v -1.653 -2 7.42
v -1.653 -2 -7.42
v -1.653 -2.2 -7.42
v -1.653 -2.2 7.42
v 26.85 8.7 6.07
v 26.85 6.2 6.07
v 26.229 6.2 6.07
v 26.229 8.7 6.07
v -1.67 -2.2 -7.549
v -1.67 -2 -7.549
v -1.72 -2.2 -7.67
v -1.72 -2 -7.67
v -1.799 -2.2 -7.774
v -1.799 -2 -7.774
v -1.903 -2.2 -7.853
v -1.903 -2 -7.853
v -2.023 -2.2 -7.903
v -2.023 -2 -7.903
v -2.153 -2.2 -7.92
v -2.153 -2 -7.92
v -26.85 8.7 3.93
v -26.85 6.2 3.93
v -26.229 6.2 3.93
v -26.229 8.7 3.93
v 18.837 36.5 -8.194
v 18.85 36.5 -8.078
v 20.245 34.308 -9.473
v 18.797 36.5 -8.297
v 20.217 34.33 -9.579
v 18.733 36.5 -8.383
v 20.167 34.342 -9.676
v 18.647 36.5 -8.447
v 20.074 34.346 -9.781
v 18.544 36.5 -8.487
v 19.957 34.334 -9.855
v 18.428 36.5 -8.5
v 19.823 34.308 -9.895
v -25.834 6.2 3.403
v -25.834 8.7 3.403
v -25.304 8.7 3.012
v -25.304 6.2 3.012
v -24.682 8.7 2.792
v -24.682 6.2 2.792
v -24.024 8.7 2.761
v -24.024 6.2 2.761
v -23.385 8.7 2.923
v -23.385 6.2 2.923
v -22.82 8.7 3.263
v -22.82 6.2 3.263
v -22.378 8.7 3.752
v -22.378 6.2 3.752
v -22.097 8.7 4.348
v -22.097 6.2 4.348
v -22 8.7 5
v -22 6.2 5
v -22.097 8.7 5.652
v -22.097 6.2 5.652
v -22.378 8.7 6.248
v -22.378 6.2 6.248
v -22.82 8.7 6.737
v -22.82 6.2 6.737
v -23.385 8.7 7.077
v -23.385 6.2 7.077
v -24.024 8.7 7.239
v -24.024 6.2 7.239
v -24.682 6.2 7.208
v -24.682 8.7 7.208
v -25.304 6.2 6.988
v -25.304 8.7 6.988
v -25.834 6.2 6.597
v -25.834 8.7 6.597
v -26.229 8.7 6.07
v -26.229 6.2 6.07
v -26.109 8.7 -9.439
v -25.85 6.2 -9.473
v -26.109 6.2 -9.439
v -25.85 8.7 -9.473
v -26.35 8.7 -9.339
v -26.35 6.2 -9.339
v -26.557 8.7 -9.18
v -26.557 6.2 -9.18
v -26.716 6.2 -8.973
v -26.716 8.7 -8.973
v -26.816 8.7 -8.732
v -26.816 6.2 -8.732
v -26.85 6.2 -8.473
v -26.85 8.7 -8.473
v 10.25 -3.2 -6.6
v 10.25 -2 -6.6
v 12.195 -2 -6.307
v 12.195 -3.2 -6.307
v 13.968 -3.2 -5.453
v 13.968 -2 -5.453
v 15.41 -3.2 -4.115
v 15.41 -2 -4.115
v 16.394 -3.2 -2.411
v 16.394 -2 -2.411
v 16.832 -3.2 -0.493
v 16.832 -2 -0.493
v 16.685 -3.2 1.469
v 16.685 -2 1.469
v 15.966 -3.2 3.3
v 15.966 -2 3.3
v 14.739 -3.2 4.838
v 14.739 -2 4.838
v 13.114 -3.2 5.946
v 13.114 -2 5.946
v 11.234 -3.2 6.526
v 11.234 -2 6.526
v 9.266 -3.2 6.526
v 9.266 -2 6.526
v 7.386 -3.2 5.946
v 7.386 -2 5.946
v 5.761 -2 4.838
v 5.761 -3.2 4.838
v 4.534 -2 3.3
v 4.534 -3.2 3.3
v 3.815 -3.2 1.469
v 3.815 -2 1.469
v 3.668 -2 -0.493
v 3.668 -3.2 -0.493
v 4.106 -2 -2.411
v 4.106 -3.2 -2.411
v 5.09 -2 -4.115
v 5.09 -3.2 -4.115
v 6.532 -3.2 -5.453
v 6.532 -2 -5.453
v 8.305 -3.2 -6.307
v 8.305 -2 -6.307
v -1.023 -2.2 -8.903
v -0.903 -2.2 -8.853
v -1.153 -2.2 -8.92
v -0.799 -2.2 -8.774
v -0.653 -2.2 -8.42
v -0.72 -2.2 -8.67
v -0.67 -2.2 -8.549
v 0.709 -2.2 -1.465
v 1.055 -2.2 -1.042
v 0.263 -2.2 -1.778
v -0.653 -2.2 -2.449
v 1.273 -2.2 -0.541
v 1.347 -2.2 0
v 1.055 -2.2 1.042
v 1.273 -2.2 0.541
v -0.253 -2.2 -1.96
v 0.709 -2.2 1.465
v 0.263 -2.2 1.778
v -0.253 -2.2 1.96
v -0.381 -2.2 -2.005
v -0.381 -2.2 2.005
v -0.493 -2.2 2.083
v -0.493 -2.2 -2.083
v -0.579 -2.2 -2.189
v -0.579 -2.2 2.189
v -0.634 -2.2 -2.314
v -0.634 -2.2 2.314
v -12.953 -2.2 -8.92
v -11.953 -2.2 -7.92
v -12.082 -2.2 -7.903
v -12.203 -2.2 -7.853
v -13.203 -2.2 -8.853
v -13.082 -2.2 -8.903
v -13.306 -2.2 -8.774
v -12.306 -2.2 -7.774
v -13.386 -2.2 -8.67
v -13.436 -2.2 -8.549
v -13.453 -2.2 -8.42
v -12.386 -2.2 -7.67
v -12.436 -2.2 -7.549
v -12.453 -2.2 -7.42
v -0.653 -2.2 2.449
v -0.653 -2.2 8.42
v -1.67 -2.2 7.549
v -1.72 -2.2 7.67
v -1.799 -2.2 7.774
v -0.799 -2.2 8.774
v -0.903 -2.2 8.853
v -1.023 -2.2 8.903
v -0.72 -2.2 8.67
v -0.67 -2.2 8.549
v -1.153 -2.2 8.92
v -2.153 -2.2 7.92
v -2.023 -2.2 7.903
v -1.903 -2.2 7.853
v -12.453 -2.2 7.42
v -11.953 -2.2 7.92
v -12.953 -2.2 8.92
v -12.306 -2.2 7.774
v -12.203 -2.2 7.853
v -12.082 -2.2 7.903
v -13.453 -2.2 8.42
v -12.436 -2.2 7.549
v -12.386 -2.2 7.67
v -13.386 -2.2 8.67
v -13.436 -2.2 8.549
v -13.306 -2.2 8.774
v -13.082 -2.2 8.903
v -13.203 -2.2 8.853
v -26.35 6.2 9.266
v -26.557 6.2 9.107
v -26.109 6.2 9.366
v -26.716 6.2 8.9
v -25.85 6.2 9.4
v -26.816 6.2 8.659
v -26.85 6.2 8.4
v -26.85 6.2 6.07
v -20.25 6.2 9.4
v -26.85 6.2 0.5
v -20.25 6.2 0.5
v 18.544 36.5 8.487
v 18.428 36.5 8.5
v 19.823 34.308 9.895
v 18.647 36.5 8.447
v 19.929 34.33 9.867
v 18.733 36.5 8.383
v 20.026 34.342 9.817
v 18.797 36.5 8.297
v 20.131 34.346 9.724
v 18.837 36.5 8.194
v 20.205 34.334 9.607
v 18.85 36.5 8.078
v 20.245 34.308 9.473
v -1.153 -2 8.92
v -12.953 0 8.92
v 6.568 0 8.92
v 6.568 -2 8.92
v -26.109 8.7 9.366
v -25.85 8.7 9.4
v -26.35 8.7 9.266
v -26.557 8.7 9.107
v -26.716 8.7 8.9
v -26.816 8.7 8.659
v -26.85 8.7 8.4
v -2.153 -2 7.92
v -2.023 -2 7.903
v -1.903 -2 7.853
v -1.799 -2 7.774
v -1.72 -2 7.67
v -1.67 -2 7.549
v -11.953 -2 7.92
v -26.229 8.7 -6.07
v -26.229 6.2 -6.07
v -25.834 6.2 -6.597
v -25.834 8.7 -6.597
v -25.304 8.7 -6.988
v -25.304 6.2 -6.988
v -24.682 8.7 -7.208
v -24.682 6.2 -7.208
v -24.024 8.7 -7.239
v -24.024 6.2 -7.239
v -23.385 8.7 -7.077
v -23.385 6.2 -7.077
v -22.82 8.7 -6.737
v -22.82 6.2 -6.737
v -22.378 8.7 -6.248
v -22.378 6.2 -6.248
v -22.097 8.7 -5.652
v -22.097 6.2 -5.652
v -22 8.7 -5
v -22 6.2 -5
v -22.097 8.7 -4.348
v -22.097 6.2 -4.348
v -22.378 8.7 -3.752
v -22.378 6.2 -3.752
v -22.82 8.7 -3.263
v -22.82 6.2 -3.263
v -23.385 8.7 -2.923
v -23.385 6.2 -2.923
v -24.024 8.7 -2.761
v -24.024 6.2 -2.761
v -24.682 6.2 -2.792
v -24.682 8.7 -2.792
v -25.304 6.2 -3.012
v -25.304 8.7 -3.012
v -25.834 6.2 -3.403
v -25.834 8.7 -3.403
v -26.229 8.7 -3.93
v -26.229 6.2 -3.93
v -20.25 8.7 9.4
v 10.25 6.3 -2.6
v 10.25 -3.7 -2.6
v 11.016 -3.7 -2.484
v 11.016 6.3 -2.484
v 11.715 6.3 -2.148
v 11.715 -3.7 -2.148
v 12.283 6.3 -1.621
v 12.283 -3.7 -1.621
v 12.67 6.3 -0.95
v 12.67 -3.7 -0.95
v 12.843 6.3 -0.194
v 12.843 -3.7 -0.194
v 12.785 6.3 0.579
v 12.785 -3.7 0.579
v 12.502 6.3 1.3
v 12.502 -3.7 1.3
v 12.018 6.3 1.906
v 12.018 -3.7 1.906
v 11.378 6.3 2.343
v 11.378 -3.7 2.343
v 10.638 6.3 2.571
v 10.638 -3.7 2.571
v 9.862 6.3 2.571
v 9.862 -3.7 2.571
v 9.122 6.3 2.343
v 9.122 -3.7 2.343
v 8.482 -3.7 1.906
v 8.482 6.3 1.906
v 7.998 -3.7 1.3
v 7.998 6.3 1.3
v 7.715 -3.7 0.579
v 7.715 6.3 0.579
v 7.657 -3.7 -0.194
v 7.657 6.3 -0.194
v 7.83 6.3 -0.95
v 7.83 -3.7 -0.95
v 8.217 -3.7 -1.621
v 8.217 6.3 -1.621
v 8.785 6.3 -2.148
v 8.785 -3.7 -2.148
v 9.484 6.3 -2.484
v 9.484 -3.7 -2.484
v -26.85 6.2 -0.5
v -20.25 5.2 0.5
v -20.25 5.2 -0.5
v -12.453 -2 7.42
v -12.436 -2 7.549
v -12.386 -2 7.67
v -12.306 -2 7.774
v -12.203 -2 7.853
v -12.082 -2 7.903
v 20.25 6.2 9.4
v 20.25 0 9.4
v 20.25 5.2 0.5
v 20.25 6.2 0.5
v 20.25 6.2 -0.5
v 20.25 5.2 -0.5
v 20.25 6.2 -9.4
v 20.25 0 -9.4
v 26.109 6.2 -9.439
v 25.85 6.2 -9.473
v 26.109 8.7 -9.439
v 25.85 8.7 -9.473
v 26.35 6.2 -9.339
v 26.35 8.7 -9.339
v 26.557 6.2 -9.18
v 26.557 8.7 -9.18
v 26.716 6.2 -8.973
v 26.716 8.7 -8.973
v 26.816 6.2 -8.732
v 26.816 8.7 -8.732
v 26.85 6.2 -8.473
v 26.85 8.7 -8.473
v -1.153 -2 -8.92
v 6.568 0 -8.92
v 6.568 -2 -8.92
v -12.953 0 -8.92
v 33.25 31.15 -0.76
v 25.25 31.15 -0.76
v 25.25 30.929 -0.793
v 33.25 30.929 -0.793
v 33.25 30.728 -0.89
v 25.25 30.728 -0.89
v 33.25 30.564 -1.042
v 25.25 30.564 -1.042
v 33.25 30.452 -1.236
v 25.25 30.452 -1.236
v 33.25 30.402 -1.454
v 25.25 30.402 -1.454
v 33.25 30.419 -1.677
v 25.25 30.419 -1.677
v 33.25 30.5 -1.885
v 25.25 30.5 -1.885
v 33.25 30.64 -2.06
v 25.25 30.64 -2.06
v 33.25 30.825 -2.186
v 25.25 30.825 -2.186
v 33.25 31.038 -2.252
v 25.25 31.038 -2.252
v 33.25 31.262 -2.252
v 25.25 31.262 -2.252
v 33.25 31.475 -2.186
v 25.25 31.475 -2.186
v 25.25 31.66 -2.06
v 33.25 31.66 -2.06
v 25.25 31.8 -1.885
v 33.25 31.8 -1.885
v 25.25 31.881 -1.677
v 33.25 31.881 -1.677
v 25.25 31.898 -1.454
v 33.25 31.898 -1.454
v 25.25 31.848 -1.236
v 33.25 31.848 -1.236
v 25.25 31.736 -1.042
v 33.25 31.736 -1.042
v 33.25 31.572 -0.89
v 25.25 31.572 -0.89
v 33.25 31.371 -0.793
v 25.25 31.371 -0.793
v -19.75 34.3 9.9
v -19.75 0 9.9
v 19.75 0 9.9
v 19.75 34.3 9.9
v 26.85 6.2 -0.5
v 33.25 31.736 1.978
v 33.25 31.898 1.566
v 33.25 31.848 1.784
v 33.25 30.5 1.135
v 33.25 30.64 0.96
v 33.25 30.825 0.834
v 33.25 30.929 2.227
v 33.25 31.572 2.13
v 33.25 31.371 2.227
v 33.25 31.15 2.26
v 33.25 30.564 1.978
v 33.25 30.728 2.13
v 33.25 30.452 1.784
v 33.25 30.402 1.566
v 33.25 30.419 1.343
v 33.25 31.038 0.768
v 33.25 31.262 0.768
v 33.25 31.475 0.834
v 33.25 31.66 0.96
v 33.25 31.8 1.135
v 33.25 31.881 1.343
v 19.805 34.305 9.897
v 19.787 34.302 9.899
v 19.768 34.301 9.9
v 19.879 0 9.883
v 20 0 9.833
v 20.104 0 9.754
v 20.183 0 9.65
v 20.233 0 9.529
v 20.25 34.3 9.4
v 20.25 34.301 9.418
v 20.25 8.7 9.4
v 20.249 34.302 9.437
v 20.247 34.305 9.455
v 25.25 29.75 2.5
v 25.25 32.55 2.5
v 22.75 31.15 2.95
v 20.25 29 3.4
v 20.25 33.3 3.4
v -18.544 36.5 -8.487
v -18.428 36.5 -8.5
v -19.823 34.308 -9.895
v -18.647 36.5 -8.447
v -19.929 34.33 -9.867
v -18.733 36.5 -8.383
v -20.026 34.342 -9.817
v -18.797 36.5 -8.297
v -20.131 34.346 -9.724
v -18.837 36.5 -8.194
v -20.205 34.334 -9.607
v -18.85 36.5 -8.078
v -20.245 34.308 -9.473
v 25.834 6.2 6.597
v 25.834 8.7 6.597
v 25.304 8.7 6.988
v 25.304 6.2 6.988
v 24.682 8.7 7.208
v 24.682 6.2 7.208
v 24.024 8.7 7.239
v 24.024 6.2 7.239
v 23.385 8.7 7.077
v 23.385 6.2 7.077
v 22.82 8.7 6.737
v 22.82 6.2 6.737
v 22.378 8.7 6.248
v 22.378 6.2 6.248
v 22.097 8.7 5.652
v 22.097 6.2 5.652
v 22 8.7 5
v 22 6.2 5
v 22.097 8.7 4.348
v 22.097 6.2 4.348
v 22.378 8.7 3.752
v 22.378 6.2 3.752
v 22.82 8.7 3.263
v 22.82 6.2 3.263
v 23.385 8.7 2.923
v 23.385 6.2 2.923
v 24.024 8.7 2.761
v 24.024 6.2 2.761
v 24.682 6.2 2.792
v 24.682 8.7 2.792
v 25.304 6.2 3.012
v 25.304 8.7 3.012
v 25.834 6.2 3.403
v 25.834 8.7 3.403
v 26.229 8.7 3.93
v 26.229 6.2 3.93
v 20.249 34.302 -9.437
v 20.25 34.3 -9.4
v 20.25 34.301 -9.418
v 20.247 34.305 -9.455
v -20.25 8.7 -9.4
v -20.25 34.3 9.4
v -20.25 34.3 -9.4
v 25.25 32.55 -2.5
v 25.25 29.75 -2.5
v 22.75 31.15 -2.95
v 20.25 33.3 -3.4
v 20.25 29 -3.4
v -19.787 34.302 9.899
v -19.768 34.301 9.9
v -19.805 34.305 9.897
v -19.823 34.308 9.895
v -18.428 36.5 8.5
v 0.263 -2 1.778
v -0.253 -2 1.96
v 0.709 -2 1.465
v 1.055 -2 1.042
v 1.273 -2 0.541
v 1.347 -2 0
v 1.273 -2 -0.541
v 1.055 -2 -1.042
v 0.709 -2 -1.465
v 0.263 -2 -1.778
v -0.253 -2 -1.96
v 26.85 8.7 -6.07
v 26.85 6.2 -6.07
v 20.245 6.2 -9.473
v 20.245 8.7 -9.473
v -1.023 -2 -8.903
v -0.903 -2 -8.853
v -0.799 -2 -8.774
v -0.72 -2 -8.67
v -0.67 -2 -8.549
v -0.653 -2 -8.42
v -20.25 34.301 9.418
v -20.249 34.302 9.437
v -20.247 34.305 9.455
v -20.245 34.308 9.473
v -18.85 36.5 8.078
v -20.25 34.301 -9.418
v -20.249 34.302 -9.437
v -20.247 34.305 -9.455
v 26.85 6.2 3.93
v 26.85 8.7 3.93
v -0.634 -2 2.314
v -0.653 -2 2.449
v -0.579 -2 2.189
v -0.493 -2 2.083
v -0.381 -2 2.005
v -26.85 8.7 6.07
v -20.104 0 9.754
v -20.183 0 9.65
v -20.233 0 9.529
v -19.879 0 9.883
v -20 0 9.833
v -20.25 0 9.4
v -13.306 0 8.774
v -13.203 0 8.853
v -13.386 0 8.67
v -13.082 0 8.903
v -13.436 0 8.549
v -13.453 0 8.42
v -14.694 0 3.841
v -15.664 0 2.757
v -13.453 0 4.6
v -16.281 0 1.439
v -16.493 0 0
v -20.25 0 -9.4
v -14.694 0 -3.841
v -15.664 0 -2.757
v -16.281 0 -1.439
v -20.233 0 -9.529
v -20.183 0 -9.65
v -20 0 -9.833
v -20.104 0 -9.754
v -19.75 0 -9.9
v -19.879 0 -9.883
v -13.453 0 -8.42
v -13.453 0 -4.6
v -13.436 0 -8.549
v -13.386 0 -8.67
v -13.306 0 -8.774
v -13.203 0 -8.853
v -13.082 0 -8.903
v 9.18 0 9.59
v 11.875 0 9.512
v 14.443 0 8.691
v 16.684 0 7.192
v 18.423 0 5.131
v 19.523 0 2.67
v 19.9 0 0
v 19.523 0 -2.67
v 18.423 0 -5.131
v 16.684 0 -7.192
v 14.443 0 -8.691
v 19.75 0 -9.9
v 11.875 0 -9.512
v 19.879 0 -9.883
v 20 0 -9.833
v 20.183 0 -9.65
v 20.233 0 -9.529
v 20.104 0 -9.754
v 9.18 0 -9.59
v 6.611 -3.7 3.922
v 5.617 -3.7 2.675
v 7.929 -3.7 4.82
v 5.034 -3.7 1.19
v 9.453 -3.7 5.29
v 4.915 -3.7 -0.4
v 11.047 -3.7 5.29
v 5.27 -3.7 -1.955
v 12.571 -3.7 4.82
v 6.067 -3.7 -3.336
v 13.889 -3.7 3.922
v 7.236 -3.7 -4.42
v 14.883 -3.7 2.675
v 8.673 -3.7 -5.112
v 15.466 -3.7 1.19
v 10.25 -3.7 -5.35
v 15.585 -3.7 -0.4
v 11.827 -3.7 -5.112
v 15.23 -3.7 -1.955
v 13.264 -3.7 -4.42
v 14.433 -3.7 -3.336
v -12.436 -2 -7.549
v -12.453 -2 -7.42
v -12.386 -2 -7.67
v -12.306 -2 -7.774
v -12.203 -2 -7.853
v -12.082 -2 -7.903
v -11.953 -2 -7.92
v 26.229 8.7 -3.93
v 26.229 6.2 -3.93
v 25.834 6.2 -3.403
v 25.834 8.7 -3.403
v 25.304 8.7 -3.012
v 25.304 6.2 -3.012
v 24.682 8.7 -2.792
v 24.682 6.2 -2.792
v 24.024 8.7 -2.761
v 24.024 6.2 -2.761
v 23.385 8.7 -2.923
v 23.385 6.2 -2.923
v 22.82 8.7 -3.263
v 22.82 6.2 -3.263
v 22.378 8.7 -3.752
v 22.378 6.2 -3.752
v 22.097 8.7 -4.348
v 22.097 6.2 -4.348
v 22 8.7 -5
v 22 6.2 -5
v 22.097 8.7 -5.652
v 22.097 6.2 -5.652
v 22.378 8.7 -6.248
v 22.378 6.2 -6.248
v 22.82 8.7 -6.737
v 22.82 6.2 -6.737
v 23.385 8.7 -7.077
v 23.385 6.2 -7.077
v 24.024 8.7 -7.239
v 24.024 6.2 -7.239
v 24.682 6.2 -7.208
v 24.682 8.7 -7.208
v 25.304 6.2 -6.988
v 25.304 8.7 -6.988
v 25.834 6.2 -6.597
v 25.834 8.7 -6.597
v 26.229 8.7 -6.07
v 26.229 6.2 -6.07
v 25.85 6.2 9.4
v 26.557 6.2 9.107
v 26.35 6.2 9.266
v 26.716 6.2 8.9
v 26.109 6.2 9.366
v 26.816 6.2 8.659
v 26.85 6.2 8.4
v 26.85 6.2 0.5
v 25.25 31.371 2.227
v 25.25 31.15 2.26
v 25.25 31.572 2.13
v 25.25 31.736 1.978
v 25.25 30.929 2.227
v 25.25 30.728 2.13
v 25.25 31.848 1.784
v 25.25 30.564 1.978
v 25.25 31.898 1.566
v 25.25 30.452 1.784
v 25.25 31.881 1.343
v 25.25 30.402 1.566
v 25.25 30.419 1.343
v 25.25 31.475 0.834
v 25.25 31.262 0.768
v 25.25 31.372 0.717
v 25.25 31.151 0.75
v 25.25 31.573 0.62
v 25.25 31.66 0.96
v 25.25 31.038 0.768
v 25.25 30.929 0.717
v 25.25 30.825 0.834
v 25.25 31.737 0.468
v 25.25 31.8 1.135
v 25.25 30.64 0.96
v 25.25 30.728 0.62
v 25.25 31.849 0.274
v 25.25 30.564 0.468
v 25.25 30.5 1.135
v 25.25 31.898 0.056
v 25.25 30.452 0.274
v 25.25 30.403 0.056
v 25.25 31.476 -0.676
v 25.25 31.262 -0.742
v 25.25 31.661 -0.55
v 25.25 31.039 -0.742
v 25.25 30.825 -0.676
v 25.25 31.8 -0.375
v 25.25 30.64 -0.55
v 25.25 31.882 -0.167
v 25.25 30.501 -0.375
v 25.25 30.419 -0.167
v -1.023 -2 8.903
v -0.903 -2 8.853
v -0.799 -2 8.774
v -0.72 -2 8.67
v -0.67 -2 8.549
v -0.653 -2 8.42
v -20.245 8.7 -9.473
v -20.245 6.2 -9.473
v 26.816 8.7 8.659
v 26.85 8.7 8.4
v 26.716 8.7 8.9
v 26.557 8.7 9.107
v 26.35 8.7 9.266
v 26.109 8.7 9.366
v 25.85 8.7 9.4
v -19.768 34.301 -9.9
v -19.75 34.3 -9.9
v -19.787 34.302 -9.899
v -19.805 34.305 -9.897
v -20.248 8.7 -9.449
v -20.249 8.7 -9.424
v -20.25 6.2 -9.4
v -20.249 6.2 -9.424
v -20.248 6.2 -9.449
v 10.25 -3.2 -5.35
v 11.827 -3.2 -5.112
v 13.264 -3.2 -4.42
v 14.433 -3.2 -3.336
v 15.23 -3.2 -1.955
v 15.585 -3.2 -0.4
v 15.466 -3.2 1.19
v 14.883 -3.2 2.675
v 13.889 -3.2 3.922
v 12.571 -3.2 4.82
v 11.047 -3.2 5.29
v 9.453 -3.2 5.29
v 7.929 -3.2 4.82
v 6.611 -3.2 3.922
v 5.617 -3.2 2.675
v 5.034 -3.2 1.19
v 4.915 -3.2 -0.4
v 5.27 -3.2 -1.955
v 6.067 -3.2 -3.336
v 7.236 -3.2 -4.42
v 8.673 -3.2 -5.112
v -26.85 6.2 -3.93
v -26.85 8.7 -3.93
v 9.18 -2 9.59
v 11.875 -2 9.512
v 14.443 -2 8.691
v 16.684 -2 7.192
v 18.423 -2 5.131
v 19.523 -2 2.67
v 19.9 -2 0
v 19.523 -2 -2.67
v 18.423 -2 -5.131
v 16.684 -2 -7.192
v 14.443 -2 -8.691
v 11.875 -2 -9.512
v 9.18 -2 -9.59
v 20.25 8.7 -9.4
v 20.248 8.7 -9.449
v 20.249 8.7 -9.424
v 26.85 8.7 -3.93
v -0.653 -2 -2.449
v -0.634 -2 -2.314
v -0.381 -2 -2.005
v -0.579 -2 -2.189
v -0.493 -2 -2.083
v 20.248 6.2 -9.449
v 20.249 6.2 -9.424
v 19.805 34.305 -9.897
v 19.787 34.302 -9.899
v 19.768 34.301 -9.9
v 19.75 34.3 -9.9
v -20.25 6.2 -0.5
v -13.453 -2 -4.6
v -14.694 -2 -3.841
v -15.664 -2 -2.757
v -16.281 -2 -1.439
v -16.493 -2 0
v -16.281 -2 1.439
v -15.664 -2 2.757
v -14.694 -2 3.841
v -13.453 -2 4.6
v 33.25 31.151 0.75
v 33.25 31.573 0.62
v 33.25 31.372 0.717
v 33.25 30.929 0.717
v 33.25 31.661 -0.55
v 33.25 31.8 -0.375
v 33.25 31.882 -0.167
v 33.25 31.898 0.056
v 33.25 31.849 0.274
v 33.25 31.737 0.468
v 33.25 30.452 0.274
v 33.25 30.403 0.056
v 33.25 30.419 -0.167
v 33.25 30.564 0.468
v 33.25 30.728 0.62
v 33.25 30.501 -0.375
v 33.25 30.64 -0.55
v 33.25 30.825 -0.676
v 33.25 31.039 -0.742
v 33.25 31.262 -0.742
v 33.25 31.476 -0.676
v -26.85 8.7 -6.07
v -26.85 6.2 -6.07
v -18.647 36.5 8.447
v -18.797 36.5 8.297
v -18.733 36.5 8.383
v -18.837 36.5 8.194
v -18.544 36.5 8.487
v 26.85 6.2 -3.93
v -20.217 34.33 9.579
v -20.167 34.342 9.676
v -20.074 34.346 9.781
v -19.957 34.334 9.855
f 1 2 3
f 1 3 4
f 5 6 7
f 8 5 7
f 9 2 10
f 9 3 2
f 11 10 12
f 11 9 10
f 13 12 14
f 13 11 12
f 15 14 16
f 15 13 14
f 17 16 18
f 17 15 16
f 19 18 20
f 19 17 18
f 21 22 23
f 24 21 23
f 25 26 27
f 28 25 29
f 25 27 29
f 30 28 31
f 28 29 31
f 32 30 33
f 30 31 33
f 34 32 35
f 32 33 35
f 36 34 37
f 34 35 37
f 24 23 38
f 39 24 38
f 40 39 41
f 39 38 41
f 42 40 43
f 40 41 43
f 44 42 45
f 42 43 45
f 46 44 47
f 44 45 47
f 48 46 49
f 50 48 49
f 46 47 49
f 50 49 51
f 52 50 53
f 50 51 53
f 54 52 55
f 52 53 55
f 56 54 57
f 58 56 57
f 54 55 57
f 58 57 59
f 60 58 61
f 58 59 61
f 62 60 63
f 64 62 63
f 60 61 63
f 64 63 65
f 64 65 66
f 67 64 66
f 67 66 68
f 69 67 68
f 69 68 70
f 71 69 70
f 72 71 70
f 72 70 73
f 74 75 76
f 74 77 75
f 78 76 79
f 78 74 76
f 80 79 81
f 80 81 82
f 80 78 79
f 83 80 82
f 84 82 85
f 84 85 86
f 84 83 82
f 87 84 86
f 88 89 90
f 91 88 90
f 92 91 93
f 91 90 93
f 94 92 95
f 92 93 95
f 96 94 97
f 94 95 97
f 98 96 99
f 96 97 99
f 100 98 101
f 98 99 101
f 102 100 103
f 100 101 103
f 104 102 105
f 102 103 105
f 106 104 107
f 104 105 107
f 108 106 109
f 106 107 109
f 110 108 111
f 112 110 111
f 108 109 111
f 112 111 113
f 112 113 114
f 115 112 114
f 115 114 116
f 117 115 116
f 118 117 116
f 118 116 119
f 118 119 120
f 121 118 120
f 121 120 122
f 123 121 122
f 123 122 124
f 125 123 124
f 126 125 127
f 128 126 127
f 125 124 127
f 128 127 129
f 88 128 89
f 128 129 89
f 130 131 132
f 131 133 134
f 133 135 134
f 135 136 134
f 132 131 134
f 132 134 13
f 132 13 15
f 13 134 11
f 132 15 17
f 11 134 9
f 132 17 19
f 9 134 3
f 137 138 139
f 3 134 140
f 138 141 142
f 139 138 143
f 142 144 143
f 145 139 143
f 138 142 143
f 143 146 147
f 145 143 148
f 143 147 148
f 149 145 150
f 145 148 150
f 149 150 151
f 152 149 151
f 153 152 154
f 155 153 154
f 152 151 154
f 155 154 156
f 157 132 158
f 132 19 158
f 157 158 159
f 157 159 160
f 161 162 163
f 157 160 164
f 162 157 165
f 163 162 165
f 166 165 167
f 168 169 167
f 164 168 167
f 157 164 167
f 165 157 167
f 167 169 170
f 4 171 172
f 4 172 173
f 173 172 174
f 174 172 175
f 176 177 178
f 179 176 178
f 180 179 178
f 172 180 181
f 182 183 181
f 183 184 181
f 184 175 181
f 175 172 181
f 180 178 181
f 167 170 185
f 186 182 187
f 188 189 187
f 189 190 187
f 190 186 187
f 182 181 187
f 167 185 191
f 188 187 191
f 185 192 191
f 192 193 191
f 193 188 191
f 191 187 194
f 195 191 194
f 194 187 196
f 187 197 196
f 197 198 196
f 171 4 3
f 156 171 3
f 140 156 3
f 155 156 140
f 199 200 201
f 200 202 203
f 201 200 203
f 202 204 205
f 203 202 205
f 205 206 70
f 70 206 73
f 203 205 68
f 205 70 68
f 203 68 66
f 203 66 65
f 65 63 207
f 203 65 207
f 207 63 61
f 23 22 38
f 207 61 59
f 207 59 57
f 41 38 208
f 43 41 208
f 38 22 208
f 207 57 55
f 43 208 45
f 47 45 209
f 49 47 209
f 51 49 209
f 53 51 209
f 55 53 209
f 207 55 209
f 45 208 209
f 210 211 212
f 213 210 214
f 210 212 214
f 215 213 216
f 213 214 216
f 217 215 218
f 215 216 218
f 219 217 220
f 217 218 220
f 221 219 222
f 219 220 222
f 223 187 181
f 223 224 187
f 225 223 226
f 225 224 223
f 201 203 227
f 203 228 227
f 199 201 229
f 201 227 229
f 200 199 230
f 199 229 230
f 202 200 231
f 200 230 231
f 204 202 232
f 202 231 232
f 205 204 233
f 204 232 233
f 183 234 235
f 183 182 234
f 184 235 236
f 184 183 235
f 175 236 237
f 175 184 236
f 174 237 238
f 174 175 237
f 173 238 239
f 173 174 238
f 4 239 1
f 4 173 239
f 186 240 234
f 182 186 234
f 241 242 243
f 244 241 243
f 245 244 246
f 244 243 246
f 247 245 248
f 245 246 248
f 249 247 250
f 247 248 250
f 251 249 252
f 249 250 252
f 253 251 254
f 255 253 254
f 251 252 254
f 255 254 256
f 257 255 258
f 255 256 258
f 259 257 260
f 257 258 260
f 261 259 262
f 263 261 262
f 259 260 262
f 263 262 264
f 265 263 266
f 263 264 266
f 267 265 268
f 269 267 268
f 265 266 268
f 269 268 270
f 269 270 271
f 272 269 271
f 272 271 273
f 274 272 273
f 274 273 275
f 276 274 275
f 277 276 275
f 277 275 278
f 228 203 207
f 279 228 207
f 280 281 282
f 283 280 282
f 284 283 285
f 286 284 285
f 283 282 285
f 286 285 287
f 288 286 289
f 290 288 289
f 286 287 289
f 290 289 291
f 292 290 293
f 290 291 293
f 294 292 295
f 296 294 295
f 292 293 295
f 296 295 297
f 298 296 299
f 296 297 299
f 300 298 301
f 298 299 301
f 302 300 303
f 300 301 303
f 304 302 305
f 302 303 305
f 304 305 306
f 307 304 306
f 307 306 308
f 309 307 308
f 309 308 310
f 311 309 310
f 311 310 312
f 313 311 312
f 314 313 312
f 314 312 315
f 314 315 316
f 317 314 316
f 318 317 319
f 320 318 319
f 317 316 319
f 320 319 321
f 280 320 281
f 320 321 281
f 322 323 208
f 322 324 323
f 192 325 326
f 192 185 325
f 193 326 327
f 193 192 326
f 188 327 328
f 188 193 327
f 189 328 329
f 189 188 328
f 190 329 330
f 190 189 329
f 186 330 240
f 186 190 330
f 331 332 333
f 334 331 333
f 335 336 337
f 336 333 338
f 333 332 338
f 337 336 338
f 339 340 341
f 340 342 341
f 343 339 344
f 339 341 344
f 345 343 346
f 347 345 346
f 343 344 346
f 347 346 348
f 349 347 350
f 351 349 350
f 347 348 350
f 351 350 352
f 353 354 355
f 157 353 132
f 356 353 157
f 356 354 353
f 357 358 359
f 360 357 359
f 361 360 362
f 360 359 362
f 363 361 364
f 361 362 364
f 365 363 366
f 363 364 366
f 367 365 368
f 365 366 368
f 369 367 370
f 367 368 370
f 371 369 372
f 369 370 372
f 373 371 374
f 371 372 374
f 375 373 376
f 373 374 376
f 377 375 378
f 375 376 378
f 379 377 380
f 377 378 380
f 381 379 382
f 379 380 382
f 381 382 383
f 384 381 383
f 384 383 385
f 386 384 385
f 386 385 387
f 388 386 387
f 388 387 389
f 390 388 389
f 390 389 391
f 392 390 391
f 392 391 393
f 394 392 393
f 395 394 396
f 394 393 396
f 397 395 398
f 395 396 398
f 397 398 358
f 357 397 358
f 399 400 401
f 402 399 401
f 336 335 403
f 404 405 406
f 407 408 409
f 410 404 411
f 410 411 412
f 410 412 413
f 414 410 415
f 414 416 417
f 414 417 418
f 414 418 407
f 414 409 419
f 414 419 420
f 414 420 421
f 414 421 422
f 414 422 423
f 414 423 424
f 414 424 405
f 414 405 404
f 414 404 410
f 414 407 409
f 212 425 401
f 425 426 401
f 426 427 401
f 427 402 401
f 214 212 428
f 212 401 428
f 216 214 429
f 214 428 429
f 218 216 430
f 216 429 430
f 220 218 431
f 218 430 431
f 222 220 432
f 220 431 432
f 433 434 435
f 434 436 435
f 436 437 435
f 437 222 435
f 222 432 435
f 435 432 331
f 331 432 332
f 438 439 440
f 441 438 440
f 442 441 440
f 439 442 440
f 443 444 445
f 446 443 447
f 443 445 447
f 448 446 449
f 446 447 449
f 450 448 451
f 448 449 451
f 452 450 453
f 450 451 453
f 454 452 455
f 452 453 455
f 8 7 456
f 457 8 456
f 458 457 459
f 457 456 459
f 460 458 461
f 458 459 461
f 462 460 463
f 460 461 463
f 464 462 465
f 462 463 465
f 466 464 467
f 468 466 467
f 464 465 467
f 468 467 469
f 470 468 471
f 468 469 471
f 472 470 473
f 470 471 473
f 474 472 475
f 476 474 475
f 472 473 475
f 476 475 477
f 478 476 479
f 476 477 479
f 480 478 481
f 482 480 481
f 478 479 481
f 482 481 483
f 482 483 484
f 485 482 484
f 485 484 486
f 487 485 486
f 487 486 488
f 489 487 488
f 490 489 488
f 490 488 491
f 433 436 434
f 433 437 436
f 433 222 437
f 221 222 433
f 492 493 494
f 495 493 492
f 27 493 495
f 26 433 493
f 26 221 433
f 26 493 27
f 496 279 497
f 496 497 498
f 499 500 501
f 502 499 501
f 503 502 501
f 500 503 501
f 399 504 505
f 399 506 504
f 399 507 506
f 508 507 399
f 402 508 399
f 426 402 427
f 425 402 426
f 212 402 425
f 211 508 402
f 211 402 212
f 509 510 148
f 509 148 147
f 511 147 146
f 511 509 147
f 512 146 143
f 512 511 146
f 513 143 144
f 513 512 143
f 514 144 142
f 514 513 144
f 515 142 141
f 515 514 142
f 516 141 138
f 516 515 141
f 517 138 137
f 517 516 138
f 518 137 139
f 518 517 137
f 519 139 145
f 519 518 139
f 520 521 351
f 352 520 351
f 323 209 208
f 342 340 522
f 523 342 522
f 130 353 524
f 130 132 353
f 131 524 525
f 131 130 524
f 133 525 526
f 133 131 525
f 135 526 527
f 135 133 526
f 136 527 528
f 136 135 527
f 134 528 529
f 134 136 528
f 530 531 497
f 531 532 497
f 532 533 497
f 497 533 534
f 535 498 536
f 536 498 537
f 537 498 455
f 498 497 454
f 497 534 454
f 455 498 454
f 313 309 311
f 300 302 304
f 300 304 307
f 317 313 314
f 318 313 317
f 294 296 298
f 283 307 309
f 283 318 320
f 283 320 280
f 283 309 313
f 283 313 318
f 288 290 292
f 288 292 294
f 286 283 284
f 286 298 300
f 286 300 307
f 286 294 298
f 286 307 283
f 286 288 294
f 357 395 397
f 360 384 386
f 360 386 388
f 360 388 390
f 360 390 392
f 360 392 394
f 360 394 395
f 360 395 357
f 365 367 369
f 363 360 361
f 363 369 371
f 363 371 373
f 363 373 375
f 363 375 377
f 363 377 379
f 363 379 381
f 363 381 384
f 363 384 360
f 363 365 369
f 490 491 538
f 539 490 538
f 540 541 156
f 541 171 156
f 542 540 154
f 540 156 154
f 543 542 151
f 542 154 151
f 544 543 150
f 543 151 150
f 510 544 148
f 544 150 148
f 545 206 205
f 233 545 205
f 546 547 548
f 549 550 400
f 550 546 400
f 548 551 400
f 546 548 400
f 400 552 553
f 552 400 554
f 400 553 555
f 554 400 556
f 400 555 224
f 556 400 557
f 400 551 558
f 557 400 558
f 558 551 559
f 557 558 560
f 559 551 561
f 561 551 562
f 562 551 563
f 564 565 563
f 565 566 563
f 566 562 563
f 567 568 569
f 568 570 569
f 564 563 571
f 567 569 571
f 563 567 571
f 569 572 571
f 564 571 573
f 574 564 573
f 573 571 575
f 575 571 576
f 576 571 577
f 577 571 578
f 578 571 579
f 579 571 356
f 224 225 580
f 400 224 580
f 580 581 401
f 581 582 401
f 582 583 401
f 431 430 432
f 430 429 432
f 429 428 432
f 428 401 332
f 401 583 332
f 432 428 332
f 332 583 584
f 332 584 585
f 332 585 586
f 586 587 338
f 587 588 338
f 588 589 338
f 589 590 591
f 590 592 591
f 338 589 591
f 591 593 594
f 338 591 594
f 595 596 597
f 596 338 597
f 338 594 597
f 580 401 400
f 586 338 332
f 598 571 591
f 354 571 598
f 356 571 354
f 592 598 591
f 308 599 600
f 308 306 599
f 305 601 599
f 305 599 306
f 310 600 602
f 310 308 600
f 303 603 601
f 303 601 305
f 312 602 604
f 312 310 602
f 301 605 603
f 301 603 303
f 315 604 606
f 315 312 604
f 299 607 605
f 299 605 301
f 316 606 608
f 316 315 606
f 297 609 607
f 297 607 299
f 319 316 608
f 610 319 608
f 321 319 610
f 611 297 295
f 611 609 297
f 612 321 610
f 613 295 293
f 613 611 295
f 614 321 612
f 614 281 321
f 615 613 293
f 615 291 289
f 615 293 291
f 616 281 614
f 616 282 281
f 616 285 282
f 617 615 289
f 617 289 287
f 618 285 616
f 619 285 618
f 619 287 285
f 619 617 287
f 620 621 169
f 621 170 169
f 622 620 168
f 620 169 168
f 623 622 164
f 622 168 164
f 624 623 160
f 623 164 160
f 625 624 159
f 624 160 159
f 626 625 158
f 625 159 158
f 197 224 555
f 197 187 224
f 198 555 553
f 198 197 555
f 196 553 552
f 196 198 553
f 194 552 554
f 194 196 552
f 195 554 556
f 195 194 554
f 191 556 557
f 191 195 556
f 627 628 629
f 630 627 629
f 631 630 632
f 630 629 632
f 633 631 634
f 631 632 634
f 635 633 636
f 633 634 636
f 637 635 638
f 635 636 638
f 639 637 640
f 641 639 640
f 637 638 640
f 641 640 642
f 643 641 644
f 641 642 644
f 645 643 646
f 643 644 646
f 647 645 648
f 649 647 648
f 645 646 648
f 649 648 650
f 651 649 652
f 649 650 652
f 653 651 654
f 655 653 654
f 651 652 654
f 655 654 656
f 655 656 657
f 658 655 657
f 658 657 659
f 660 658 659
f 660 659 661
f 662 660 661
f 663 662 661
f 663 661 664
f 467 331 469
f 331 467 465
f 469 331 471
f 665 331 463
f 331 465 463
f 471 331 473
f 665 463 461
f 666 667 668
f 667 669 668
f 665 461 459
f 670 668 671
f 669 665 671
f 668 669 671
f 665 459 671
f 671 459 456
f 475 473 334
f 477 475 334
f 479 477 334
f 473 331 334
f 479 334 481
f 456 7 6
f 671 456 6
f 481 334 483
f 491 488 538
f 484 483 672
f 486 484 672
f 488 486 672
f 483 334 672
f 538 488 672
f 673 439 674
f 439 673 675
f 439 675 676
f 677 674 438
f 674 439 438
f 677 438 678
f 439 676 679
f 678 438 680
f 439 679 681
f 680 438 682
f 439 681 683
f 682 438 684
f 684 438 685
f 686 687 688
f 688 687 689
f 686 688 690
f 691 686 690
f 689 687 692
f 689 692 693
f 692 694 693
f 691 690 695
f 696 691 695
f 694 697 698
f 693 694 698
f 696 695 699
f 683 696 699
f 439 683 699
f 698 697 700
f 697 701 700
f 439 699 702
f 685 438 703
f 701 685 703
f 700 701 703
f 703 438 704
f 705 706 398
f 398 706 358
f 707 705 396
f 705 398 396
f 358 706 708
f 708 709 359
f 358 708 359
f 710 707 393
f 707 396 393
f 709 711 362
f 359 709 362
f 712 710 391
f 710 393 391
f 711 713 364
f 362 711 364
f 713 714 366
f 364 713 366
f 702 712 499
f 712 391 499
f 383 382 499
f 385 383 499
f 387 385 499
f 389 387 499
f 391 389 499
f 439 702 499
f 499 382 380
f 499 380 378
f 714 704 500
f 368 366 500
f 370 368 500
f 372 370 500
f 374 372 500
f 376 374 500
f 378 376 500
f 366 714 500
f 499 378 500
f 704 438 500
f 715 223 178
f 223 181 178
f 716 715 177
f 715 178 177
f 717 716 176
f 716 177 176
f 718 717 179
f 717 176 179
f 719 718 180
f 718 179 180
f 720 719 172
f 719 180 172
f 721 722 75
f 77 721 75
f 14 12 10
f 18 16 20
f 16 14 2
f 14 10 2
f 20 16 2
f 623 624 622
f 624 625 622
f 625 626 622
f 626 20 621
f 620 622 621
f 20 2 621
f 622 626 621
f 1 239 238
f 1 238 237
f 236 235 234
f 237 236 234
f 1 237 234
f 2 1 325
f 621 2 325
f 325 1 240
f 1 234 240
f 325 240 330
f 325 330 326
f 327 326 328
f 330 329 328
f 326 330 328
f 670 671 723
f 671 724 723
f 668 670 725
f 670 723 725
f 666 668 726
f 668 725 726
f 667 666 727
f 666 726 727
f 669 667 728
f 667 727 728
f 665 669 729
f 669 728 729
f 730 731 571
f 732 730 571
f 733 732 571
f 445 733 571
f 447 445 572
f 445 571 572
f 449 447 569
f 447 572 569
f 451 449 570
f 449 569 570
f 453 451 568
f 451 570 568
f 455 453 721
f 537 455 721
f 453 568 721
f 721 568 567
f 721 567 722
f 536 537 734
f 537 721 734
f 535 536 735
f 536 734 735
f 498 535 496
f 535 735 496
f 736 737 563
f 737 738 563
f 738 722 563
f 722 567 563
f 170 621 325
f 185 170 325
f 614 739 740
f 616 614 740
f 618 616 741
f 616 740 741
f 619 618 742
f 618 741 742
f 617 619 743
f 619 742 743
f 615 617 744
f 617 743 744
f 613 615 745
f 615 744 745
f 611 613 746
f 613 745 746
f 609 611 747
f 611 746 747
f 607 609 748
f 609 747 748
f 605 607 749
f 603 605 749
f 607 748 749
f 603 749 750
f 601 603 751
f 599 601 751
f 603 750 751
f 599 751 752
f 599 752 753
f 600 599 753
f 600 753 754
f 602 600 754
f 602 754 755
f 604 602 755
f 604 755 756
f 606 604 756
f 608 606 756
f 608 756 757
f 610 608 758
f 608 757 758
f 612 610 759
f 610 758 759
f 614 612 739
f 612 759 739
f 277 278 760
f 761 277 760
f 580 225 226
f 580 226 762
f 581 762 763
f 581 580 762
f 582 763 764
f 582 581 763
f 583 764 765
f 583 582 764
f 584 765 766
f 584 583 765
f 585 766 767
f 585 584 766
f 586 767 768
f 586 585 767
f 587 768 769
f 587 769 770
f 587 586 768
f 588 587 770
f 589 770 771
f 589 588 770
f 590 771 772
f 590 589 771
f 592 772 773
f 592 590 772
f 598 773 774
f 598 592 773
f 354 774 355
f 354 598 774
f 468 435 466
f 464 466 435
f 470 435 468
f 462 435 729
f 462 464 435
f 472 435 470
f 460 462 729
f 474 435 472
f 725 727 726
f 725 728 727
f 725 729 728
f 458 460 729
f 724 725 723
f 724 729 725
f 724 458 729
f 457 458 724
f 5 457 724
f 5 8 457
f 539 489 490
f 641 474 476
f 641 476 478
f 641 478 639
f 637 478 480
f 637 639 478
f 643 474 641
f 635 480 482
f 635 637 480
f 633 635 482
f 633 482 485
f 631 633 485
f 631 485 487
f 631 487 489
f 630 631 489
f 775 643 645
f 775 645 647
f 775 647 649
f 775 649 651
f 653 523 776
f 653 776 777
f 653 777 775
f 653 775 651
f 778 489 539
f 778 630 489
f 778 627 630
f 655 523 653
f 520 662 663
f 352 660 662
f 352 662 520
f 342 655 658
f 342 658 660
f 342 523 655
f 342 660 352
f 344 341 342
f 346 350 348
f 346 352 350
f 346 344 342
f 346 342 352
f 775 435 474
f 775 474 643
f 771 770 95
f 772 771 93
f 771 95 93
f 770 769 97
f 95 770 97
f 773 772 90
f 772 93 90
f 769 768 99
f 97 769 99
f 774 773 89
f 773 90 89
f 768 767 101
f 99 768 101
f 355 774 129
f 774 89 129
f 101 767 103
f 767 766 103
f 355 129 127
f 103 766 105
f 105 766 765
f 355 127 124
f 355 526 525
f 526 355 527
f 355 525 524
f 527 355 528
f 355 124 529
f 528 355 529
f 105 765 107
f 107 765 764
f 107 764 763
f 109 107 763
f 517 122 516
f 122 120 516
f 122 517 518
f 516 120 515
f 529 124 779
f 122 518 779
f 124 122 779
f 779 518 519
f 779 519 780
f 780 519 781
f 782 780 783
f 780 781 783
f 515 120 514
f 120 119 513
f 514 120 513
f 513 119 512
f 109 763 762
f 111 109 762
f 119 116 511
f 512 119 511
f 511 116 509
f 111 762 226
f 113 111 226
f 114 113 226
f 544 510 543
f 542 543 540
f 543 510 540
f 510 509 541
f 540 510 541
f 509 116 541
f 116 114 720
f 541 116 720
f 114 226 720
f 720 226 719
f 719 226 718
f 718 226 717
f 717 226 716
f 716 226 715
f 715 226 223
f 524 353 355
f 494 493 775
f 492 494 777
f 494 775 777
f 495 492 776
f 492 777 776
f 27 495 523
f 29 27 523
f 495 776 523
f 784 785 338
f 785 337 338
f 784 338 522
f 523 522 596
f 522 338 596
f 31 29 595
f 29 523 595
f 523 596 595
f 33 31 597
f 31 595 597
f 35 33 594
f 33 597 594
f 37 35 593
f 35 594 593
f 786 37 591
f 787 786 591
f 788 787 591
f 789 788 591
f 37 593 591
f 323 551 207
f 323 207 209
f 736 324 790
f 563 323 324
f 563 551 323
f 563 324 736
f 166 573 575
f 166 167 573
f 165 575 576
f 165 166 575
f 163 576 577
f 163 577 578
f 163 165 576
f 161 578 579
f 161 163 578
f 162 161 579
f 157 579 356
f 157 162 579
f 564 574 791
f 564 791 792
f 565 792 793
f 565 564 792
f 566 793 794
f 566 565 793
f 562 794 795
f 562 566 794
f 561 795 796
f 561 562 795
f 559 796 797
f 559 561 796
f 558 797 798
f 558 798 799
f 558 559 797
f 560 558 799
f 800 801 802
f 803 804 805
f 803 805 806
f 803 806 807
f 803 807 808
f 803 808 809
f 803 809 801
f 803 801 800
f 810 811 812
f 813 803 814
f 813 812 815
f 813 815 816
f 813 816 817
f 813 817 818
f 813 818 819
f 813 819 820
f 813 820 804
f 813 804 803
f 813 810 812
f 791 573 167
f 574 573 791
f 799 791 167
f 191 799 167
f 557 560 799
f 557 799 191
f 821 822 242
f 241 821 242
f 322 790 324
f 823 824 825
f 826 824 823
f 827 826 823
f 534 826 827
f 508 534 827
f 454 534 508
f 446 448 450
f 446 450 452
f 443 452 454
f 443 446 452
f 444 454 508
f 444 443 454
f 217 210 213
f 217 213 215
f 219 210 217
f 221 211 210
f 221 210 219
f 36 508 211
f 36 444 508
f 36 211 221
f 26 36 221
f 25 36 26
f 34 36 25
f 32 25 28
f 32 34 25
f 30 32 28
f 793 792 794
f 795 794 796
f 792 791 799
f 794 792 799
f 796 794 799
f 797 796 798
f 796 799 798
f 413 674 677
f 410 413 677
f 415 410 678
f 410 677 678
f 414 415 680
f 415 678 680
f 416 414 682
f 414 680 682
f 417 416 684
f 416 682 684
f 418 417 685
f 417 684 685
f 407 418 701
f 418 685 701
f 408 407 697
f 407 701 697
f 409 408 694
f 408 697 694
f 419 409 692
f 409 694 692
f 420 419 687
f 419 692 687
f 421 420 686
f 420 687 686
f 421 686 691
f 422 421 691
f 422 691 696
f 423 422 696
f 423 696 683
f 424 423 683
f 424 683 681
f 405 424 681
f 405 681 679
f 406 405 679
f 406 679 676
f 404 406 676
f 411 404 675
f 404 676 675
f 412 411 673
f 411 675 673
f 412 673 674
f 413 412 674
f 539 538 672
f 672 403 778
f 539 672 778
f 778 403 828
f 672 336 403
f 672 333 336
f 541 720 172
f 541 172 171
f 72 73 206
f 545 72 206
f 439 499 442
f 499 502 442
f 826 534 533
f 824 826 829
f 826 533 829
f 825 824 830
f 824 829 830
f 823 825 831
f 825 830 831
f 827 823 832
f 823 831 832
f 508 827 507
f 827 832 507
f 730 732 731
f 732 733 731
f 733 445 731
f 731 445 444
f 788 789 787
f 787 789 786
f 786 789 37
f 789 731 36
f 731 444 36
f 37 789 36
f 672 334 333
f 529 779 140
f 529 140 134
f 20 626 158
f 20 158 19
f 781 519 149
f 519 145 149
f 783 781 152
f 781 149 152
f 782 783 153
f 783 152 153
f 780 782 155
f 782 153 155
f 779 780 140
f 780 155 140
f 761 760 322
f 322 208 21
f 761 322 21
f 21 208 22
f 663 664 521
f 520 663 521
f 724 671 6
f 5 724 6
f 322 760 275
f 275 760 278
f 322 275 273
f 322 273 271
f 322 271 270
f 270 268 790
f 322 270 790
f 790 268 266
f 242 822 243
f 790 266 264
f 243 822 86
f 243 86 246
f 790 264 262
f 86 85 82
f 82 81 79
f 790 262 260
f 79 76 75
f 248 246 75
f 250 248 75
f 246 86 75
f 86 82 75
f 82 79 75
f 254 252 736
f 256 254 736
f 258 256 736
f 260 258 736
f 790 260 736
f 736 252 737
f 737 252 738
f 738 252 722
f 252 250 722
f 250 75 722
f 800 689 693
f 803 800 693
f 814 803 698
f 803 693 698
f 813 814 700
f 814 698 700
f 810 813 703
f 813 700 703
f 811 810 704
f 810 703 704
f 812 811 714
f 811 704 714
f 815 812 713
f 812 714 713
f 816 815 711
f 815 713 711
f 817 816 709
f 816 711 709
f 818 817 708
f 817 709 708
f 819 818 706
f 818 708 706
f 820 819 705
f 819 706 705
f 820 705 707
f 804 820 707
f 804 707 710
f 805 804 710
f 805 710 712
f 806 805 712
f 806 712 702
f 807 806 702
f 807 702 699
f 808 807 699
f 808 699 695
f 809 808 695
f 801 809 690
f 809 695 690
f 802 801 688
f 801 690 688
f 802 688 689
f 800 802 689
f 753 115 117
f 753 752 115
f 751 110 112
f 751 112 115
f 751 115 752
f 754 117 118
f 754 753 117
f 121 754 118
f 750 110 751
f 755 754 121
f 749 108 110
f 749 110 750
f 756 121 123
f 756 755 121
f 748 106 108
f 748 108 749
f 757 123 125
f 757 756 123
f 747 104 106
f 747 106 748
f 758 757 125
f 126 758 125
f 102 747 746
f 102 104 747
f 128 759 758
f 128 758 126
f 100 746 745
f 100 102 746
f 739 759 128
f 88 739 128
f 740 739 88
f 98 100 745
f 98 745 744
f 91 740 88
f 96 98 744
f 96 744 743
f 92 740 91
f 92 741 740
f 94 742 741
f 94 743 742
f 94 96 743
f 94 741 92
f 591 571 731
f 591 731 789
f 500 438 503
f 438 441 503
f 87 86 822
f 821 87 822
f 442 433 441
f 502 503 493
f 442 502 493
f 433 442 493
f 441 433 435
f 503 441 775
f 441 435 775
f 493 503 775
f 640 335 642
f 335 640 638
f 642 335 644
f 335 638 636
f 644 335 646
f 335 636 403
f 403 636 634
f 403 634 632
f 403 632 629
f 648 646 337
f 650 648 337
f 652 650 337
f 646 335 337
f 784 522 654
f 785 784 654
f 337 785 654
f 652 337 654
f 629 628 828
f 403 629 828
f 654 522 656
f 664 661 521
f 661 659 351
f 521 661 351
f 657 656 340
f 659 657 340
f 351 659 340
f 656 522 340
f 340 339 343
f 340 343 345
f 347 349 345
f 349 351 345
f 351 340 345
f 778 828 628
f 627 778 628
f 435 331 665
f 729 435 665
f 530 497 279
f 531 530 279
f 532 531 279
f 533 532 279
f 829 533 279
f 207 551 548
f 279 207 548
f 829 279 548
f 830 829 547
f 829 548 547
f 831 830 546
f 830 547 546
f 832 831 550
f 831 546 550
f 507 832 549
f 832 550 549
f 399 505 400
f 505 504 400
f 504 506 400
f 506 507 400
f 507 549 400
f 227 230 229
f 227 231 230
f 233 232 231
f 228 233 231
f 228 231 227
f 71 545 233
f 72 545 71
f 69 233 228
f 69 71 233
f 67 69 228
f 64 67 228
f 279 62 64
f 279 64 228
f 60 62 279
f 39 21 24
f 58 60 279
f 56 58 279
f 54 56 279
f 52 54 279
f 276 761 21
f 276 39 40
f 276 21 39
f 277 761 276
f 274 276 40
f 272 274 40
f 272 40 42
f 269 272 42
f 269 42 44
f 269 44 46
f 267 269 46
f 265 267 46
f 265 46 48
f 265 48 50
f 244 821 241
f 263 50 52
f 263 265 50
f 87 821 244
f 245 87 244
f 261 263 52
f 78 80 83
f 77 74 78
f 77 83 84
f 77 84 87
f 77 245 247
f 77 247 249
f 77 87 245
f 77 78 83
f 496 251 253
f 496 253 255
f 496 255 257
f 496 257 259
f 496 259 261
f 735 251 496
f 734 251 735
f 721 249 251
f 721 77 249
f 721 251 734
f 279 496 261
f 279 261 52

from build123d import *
from OCP.BRepFilletAPI import BRepFilletAPI_MakeChamfer

# Parameters (mm, degrees)
SKETCH_1_W       = 40.5
SKETCH_1_H       = 19.8
BODY_DEPTH       = 36.5
CHAMFER_1_SIZE   = 2.2
CHAMFER_1_SIZE2  = 1.4
FILLET_1_R       = 0.5
MOUNT_DEPTH      = 2.5
FILLET_3_R       = 1
EXTRUDE_3_DEPTH  = 0.5
EXTRUDE_4_DEPTH  = 2
SKETCH_5_W       = 10.8
SKETCH_5_H       = 15.84
EXTRUDE_5_DEPTH  = 0.2
SKETCH_6_R       = 6.6
EXTRUDE_6_DEPTH  = 1.2
SKETCH_7_R       = 5.35
EXTRUDE_7_DEPTH  = 0.5
SKETCH_8_R       = 2.6
SHAFT_HOLE_DEPTH = 10
FILLET_2_R       = 0.5
SKETCH_11_R      = 0.75
EXTRUDE_10_DEPTH = 8


with BuildPart() as part:
    # Эскиз1 → Body (new body)
    with BuildSketch(Plane(origin=(0, 0, 0), x_dir=(1, 0, 0), z_dir=(0, 1, 0))):
        Rectangle(SKETCH_1_W, SKETCH_1_H)
    extrude(amount=BODY_DEPTH)

    # Фаска1: one chamfer whose edges measure the first distance from different faces: ONE call of the kernel's chamfer builder (chamfer() names one face for all edges)
    chamfer_1_edges_1 = [part.edges().sort_by_distance(p)[0] for p in [
        (20.25, 36.5, 0),
    ]]
    chamfer_1_side_1 = [part.faces().sort_by_distance(p)[0] for p in [
        (20.25, 18.25, 0),
    ]]
    chamfer_1_edges_2 = [part.edges().sort_by_distance(p)[0] for p in [
        (0, 36.5, -9.9),
    ]]
    chamfer_1_side_2 = [part.faces().sort_by_distance(p)[0] for p in [
        (0, 18.25, -9.9),
    ]]
    chamfer_1_edges_3 = [part.edges().sort_by_distance(p)[0] for p in [
        (-20.25, 36.5, 0),
    ]]
    chamfer_1_side_3 = [part.faces().sort_by_distance(p)[0] for p in [
        (-20.25, 18.25, 0),
    ]]
    chamfer_1_edges_4 = [part.edges().sort_by_distance(p)[0] for p in [
        (0, 36.5, 9.9),
    ]]
    chamfer_1_side_4 = [part.faces().sort_by_distance(p)[0] for p in [
        (0, 18.25, 9.9),
    ]]
    chamfer_1 = BRepFilletAPI_MakeChamfer(part.part.solid().wrapped)
    for e in chamfer_1_edges_1:
        chamfer_1.Add(CHAMFER_1_SIZE, CHAMFER_1_SIZE2, e.wrapped, chamfer_1_side_1[0].wrapped)  # the first distance lies on this face
    for e in chamfer_1_edges_2:
        chamfer_1.Add(CHAMFER_1_SIZE, CHAMFER_1_SIZE2, e.wrapped, chamfer_1_side_2[0].wrapped)  # the first distance lies on this face
    for e in chamfer_1_edges_3:
        chamfer_1.Add(CHAMFER_1_SIZE, CHAMFER_1_SIZE2, e.wrapped, chamfer_1_side_3[0].wrapped)  # the first distance lies on this face
    for e in chamfer_1_edges_4:
        chamfer_1.Add(CHAMFER_1_SIZE, CHAMFER_1_SIZE2, e.wrapped, chamfer_1_side_4[0].wrapped)  # the first distance lies on this face
    add(Compound.cast(chamfer_1.Shape()), mode=Mode.REPLACE)

    # Скругление1
    # the kernel refuses this fillet: 0.5 mm, written as the material it takes off along each edge
    with BuildSketch(Plane(origin=(-20.25, -1.25, 9.9), x_dir=(1, 0, 0), z_dir=(0, 1, 0)), Plane(origin=(-20.25, -1.25, -9.9), x_dir=(0, 0, 1), z_dir=(0, 1, 0))) as fillet_1_piece_1:
        with BuildLine():
            CenterArc((FILLET_1_R, FILLET_1_R), FILLET_1_R, 180, 90)
            Line((0, FILLET_1_R), (0, 0))
            Line((0, 0), (FILLET_1_R, 0))
        make_face()
    extrude(amount=36.8, mode=Mode.SUBTRACT)
    with BuildSketch(Plane(origin=(20.25, -1.25, -9.9), x_dir=(0, 0, 1), z_dir=(0, 1, 0)), Plane(origin=(20.25, -1.25, 9.9), x_dir=(-1, 0, 0), z_dir=(0, 1, 0))) as fillet_1_piece_2:
        with BuildLine():
            CenterArc((FILLET_1_R, -FILLET_1_R), FILLET_1_R, 90, 90)
            Line((0, -FILLET_1_R), (0, 0))
            Line((0, 0), (FILLET_1_R, 0))
        make_face()
    extrude(amount=36.8, mode=Mode.SUBTRACT)
    with BuildSketch(Plane(origin=(20.689497717, 33.609360731, -10.339497717), x_dir=(0.25395078633508533, -0.3990655213836877, 0.8810537485094523), z_dir=(-0.47301616487963943, 0.7433111162394352, 0.47301616487964004)), Plane(origin=(20.689497717, 33.609360731, 10.339497717), x_dir=(-0.8810537485094526, -0.39906552138369156, 0.25395078633507817), z_dir=(-0.47301616487963943, 0.7433111162394352, -0.47301616487964004))) as fillet_1_piece_3:
        with BuildLine():
            CenterArc((FILLET_1_R * 0.743311116239, -FILLET_1_R), FILLET_1_R, 90, 73.247664886)
            Line((-FILLET_1_R * 0.21424849821, -FILLET_1_R * 0.711764705882), (0, 0))
            Line((0, 0), (FILLET_1_R * 0.743311116239, 0))
        make_face()
    extrude(amount=4.818007508, mode=Mode.SUBTRACT)
    with BuildSketch(Plane(origin=(-20.689497717, 33.609360731, -10.339497717), x_dir=(-0.25395078633507856, -0.3990655213836921, 0.8810537485094524), z_dir=(0.47301616487963943, 0.7433111162394352, 0.47301616487964004)), Plane(origin=(-20.689497717, 33.609360731, 10.339497717), x_dir=(0.8810537485094527, -0.3990655213836916, 0.25395078633507817), z_dir=(0.47301616487963943, 0.7433111162394352, -0.47301616487964004))) as fillet_1_piece_4:
        with BuildLine():
            CenterArc((FILLET_1_R * 0.743311116239, FILLET_1_R), FILLET_1_R, 196.752335114, 73.247664886)
            Line((-FILLET_1_R * 0.21424849821, FILLET_1_R * 0.711764705882), (0, 0))
            Line((0, 0), (FILLET_1_R * 0.743311116239, 0))
        make_face()
    extrude(amount=4.818007508, mode=Mode.SUBTRACT)

    # Эскиз2 → Mount (add)
    with BuildSketch(Plane(origin=(0, 6.2, 0), x_dir=(-1, 0, 0), z_dir=(0, -1, 0))):
        with BuildLine():
            Line((-26.85, 9.472835762), (26.85, 9.472835762))
            Line((26.85, 9.472835762), (26.85, 6.069767442))
            Line((26.85, 6.069767442), (26.229418506, 6.069767442))
            ThreePointArc((26.229418506, 6.069767442), (22, 5), (26.229418506, 3.930232558))
            Line((26.229418506, 3.930232558), (26.85, 3.930232558))
            Line((26.85, 3.930232558), (26.85, -3.930232558))
            Line((26.85, -3.930232558), (26.229418506, -3.930232558))
            ThreePointArc((26.229418506, -3.930232558), (22, -5), (26.229418506, -6.069767442))
            Line((26.229418506, -6.069767442), (26.85, -6.069767442))
            Line((26.85, -6.069767442), (26.85, -9.4))
            Line((26.85, -9.4), (-26.85, -9.4))
            Line((-26.85, -9.4), (-26.85, -6.069767442))
            Line((-26.85, -6.069767442), (-26.229418506, -6.069767442))
            ThreePointArc((-26.229418506, -6.069767442), (-22, -5), (-26.229418506, -3.930232558))
            Line((-26.229418506, -3.930232558), (-26.85, -3.930232558))
            Line((-26.85, -3.930232558), (-26.85, 3.930232558))
            Line((-26.85, 3.930232558), (-26.229418506, 3.930232558))
            ThreePointArc((-26.229418506, 3.930232558), (-22, 5), (-26.229418506, 6.069767442))
            Line((-26.229418506, 6.069767442), (-26.85, 6.069767442))
            Line((-26.85, 6.069767442), (-26.85, 9.472835762))
        make_face()
    extrude(amount=-MOUNT_DEPTH)

    # Скругление3
    fillet_3_edges = [part.edges().sort_by_distance(p)[0] for p in [
        (-26.85, 7.45, 9.4),
        (26.85, 7.45, 9.4),
        (26.85, 7.45, -9.472835762),
        (-26.85, 7.45, -9.472835762),
    ]]
    fillet(fillet_3_edges, radius=FILLET_3_R)

    # Эскиз3 → Бобышка-Вытянуть3 (add, symmetric)
    with BuildSketch(Plane.XY):
        Polygon((-26.85, 6.2), (-20.25, 6.2), (-20.25, 5.2), align=None)
        Polygon((20.25, 5.2), (26.85, 6.2), (20.25, 6.2), align=None)
    extrude(amount=EXTRUDE_3_DEPTH, both=True)

    # Эскиз4 → Бобышка-Вытянуть4 (add)
    with BuildSketch(Plane.XZ):
        with BuildLine():
            Line((-13.452560024, -8.92), (-13.452560024, -4.6))
            ThreePointArc((-13.452560024, -4.6), (-16.49296823, 0), (-13.452560024, 4.6))
            Line((-13.452560024, 4.6), (-13.452560024, 8.92))
            Line((-13.452560024, 8.92), (6.568139057, 8.92))
            ThreePointArc((6.568139057, 8.92), (19.9, 0), (6.568139057, -8.92))
            Line((6.568139057, -8.92), (-13.452560024, -8.92))
        make_face()
    extrude(amount=EXTRUDE_4_DEPTH)

    # Эскиз5 → Бобышка-Вытянуть5 (add)
    with BuildSketch(Plane.XZ.offset(2)):
        with BuildLine():
            Line((-13.452560024, 8.92), (-0.652560024, 8.92))
            Line((-0.652560024, 8.92), (-0.652560024, 2))
            ThreePointArc((-0.652560024, 2), (1.347439976, 0), (-0.652560024, -2))
            Line((-0.652560024, -2), (-0.652560024, -8.92))
            Line((-0.652560024, -8.92), (-13.452560024, -8.92))
            Line((-13.452560024, -8.92), (-13.452560024, 8.92))
        make_face()
        with Locations((-7.052560024, 0)):
            Rectangle(SKETCH_5_W, SKETCH_5_H, mode=Mode.SUBTRACT)
    extrude(amount=EXTRUDE_5_DEPTH)

    # Эскиз6 → Бобышка-Вытянуть6 (add)
    with BuildSketch(Plane.XZ.offset(2)):
        with Locations(Location((10.25, 0, 0), (0, 0, 270))):
            Circle(SKETCH_6_R)
    extrude(amount=EXTRUDE_6_DEPTH)

    # Эскиз7 → Бобышка-Вытянуть7 (add)
    with BuildSketch(Plane.XZ.offset(3.2)):
        with Locations(Location((10.25, 0, 0), (0, 0, 270))):
            Circle(SKETCH_7_R)
    extrude(amount=EXTRUDE_7_DEPTH)

    # Эскиз8 → Shaft hole (cut)
    with BuildSketch(Plane.XZ.offset(3.7)):
        with Locations(Location((10.25, 0, 0), (0, 0, 270))):
            Circle(SKETCH_8_R)
    extrude(amount=-SHAFT_HOLE_DEPTH, mode=Mode.SUBTRACT)

    # Скругление2
    fillet_2_edges = [part.edges().sort_by_distance(p)[0] for p in [
        (-13.452560024, -1.1, 8.92),
        (-0.652560024, -2.1, 2),
        (-0.652560024, -2.1, -2),
        (-0.652560024, -2.1, 8.92),
        (-0.652560024, -2.1, -8.92),
        (-13.452560024, -1.1, -8.92),
        (-1.652560024, -2.1, 7.92),
        (-1.652560024, -2.1, -7.92),
        (-12.452560024, -2.1, 7.92),
        (-12.452560024, -2.1, -7.92),
    ]]
    fillet(fillet_2_edges, radius=FILLET_2_R)

    # Эскиз10 → Rubber section 0
    with BuildSketch(Plane(origin=(25.25, 0, 0), x_dir=(0, 0, -1), z_dir=(1, 0, 0))):
        with BuildLine():
            Line((-2.5, 29.75), (2.5, 29.75))
            Line((2.5, 29.75), (2.5, 32.55))
            Line((2.5, 32.55), (-2.5, 32.55))
            Line((-2.5, 32.55), (-2.5, 29.75))
        make_face()
    # Эскиз9 → Rubber section 1
    with BuildSketch(Plane(origin=(20.25, 0, 0), x_dir=(0, 0, -1), z_dir=(1, 0, 0))):
        with BuildLine():
            Line((-3.4, 33.3), (3.4, 33.3))
            Line((3.4, 33.3), (3.4, 29))
            Line((3.4, 29), (-3.4, 29))
            Line((-3.4, 29), (-3.4, 33.3))
        make_face()
    loft()

    # Эскиз11 → Бобышка-Вытянуть10 (add)
    with BuildSketch(Plane(origin=(25.25, 0, 0), x_dir=(0, 0, -1), z_dir=(1, 0, 0))):
        with Locations(Location((0, 31.150503064, 0), (0, 0, 180))):
            Circle(SKETCH_11_R)
        with Locations(Location((1.509999917, 31.15000331, 0), (0, 0, 180))):
            Circle(SKETCH_11_R)
        with Locations(Location((-1.509999915, 31.149996646, 0), (0, 0, 180))):
            Circle(SKETCH_11_R)
    extrude(amount=EXTRUDE_10_DEPTH)


solid = part.part
